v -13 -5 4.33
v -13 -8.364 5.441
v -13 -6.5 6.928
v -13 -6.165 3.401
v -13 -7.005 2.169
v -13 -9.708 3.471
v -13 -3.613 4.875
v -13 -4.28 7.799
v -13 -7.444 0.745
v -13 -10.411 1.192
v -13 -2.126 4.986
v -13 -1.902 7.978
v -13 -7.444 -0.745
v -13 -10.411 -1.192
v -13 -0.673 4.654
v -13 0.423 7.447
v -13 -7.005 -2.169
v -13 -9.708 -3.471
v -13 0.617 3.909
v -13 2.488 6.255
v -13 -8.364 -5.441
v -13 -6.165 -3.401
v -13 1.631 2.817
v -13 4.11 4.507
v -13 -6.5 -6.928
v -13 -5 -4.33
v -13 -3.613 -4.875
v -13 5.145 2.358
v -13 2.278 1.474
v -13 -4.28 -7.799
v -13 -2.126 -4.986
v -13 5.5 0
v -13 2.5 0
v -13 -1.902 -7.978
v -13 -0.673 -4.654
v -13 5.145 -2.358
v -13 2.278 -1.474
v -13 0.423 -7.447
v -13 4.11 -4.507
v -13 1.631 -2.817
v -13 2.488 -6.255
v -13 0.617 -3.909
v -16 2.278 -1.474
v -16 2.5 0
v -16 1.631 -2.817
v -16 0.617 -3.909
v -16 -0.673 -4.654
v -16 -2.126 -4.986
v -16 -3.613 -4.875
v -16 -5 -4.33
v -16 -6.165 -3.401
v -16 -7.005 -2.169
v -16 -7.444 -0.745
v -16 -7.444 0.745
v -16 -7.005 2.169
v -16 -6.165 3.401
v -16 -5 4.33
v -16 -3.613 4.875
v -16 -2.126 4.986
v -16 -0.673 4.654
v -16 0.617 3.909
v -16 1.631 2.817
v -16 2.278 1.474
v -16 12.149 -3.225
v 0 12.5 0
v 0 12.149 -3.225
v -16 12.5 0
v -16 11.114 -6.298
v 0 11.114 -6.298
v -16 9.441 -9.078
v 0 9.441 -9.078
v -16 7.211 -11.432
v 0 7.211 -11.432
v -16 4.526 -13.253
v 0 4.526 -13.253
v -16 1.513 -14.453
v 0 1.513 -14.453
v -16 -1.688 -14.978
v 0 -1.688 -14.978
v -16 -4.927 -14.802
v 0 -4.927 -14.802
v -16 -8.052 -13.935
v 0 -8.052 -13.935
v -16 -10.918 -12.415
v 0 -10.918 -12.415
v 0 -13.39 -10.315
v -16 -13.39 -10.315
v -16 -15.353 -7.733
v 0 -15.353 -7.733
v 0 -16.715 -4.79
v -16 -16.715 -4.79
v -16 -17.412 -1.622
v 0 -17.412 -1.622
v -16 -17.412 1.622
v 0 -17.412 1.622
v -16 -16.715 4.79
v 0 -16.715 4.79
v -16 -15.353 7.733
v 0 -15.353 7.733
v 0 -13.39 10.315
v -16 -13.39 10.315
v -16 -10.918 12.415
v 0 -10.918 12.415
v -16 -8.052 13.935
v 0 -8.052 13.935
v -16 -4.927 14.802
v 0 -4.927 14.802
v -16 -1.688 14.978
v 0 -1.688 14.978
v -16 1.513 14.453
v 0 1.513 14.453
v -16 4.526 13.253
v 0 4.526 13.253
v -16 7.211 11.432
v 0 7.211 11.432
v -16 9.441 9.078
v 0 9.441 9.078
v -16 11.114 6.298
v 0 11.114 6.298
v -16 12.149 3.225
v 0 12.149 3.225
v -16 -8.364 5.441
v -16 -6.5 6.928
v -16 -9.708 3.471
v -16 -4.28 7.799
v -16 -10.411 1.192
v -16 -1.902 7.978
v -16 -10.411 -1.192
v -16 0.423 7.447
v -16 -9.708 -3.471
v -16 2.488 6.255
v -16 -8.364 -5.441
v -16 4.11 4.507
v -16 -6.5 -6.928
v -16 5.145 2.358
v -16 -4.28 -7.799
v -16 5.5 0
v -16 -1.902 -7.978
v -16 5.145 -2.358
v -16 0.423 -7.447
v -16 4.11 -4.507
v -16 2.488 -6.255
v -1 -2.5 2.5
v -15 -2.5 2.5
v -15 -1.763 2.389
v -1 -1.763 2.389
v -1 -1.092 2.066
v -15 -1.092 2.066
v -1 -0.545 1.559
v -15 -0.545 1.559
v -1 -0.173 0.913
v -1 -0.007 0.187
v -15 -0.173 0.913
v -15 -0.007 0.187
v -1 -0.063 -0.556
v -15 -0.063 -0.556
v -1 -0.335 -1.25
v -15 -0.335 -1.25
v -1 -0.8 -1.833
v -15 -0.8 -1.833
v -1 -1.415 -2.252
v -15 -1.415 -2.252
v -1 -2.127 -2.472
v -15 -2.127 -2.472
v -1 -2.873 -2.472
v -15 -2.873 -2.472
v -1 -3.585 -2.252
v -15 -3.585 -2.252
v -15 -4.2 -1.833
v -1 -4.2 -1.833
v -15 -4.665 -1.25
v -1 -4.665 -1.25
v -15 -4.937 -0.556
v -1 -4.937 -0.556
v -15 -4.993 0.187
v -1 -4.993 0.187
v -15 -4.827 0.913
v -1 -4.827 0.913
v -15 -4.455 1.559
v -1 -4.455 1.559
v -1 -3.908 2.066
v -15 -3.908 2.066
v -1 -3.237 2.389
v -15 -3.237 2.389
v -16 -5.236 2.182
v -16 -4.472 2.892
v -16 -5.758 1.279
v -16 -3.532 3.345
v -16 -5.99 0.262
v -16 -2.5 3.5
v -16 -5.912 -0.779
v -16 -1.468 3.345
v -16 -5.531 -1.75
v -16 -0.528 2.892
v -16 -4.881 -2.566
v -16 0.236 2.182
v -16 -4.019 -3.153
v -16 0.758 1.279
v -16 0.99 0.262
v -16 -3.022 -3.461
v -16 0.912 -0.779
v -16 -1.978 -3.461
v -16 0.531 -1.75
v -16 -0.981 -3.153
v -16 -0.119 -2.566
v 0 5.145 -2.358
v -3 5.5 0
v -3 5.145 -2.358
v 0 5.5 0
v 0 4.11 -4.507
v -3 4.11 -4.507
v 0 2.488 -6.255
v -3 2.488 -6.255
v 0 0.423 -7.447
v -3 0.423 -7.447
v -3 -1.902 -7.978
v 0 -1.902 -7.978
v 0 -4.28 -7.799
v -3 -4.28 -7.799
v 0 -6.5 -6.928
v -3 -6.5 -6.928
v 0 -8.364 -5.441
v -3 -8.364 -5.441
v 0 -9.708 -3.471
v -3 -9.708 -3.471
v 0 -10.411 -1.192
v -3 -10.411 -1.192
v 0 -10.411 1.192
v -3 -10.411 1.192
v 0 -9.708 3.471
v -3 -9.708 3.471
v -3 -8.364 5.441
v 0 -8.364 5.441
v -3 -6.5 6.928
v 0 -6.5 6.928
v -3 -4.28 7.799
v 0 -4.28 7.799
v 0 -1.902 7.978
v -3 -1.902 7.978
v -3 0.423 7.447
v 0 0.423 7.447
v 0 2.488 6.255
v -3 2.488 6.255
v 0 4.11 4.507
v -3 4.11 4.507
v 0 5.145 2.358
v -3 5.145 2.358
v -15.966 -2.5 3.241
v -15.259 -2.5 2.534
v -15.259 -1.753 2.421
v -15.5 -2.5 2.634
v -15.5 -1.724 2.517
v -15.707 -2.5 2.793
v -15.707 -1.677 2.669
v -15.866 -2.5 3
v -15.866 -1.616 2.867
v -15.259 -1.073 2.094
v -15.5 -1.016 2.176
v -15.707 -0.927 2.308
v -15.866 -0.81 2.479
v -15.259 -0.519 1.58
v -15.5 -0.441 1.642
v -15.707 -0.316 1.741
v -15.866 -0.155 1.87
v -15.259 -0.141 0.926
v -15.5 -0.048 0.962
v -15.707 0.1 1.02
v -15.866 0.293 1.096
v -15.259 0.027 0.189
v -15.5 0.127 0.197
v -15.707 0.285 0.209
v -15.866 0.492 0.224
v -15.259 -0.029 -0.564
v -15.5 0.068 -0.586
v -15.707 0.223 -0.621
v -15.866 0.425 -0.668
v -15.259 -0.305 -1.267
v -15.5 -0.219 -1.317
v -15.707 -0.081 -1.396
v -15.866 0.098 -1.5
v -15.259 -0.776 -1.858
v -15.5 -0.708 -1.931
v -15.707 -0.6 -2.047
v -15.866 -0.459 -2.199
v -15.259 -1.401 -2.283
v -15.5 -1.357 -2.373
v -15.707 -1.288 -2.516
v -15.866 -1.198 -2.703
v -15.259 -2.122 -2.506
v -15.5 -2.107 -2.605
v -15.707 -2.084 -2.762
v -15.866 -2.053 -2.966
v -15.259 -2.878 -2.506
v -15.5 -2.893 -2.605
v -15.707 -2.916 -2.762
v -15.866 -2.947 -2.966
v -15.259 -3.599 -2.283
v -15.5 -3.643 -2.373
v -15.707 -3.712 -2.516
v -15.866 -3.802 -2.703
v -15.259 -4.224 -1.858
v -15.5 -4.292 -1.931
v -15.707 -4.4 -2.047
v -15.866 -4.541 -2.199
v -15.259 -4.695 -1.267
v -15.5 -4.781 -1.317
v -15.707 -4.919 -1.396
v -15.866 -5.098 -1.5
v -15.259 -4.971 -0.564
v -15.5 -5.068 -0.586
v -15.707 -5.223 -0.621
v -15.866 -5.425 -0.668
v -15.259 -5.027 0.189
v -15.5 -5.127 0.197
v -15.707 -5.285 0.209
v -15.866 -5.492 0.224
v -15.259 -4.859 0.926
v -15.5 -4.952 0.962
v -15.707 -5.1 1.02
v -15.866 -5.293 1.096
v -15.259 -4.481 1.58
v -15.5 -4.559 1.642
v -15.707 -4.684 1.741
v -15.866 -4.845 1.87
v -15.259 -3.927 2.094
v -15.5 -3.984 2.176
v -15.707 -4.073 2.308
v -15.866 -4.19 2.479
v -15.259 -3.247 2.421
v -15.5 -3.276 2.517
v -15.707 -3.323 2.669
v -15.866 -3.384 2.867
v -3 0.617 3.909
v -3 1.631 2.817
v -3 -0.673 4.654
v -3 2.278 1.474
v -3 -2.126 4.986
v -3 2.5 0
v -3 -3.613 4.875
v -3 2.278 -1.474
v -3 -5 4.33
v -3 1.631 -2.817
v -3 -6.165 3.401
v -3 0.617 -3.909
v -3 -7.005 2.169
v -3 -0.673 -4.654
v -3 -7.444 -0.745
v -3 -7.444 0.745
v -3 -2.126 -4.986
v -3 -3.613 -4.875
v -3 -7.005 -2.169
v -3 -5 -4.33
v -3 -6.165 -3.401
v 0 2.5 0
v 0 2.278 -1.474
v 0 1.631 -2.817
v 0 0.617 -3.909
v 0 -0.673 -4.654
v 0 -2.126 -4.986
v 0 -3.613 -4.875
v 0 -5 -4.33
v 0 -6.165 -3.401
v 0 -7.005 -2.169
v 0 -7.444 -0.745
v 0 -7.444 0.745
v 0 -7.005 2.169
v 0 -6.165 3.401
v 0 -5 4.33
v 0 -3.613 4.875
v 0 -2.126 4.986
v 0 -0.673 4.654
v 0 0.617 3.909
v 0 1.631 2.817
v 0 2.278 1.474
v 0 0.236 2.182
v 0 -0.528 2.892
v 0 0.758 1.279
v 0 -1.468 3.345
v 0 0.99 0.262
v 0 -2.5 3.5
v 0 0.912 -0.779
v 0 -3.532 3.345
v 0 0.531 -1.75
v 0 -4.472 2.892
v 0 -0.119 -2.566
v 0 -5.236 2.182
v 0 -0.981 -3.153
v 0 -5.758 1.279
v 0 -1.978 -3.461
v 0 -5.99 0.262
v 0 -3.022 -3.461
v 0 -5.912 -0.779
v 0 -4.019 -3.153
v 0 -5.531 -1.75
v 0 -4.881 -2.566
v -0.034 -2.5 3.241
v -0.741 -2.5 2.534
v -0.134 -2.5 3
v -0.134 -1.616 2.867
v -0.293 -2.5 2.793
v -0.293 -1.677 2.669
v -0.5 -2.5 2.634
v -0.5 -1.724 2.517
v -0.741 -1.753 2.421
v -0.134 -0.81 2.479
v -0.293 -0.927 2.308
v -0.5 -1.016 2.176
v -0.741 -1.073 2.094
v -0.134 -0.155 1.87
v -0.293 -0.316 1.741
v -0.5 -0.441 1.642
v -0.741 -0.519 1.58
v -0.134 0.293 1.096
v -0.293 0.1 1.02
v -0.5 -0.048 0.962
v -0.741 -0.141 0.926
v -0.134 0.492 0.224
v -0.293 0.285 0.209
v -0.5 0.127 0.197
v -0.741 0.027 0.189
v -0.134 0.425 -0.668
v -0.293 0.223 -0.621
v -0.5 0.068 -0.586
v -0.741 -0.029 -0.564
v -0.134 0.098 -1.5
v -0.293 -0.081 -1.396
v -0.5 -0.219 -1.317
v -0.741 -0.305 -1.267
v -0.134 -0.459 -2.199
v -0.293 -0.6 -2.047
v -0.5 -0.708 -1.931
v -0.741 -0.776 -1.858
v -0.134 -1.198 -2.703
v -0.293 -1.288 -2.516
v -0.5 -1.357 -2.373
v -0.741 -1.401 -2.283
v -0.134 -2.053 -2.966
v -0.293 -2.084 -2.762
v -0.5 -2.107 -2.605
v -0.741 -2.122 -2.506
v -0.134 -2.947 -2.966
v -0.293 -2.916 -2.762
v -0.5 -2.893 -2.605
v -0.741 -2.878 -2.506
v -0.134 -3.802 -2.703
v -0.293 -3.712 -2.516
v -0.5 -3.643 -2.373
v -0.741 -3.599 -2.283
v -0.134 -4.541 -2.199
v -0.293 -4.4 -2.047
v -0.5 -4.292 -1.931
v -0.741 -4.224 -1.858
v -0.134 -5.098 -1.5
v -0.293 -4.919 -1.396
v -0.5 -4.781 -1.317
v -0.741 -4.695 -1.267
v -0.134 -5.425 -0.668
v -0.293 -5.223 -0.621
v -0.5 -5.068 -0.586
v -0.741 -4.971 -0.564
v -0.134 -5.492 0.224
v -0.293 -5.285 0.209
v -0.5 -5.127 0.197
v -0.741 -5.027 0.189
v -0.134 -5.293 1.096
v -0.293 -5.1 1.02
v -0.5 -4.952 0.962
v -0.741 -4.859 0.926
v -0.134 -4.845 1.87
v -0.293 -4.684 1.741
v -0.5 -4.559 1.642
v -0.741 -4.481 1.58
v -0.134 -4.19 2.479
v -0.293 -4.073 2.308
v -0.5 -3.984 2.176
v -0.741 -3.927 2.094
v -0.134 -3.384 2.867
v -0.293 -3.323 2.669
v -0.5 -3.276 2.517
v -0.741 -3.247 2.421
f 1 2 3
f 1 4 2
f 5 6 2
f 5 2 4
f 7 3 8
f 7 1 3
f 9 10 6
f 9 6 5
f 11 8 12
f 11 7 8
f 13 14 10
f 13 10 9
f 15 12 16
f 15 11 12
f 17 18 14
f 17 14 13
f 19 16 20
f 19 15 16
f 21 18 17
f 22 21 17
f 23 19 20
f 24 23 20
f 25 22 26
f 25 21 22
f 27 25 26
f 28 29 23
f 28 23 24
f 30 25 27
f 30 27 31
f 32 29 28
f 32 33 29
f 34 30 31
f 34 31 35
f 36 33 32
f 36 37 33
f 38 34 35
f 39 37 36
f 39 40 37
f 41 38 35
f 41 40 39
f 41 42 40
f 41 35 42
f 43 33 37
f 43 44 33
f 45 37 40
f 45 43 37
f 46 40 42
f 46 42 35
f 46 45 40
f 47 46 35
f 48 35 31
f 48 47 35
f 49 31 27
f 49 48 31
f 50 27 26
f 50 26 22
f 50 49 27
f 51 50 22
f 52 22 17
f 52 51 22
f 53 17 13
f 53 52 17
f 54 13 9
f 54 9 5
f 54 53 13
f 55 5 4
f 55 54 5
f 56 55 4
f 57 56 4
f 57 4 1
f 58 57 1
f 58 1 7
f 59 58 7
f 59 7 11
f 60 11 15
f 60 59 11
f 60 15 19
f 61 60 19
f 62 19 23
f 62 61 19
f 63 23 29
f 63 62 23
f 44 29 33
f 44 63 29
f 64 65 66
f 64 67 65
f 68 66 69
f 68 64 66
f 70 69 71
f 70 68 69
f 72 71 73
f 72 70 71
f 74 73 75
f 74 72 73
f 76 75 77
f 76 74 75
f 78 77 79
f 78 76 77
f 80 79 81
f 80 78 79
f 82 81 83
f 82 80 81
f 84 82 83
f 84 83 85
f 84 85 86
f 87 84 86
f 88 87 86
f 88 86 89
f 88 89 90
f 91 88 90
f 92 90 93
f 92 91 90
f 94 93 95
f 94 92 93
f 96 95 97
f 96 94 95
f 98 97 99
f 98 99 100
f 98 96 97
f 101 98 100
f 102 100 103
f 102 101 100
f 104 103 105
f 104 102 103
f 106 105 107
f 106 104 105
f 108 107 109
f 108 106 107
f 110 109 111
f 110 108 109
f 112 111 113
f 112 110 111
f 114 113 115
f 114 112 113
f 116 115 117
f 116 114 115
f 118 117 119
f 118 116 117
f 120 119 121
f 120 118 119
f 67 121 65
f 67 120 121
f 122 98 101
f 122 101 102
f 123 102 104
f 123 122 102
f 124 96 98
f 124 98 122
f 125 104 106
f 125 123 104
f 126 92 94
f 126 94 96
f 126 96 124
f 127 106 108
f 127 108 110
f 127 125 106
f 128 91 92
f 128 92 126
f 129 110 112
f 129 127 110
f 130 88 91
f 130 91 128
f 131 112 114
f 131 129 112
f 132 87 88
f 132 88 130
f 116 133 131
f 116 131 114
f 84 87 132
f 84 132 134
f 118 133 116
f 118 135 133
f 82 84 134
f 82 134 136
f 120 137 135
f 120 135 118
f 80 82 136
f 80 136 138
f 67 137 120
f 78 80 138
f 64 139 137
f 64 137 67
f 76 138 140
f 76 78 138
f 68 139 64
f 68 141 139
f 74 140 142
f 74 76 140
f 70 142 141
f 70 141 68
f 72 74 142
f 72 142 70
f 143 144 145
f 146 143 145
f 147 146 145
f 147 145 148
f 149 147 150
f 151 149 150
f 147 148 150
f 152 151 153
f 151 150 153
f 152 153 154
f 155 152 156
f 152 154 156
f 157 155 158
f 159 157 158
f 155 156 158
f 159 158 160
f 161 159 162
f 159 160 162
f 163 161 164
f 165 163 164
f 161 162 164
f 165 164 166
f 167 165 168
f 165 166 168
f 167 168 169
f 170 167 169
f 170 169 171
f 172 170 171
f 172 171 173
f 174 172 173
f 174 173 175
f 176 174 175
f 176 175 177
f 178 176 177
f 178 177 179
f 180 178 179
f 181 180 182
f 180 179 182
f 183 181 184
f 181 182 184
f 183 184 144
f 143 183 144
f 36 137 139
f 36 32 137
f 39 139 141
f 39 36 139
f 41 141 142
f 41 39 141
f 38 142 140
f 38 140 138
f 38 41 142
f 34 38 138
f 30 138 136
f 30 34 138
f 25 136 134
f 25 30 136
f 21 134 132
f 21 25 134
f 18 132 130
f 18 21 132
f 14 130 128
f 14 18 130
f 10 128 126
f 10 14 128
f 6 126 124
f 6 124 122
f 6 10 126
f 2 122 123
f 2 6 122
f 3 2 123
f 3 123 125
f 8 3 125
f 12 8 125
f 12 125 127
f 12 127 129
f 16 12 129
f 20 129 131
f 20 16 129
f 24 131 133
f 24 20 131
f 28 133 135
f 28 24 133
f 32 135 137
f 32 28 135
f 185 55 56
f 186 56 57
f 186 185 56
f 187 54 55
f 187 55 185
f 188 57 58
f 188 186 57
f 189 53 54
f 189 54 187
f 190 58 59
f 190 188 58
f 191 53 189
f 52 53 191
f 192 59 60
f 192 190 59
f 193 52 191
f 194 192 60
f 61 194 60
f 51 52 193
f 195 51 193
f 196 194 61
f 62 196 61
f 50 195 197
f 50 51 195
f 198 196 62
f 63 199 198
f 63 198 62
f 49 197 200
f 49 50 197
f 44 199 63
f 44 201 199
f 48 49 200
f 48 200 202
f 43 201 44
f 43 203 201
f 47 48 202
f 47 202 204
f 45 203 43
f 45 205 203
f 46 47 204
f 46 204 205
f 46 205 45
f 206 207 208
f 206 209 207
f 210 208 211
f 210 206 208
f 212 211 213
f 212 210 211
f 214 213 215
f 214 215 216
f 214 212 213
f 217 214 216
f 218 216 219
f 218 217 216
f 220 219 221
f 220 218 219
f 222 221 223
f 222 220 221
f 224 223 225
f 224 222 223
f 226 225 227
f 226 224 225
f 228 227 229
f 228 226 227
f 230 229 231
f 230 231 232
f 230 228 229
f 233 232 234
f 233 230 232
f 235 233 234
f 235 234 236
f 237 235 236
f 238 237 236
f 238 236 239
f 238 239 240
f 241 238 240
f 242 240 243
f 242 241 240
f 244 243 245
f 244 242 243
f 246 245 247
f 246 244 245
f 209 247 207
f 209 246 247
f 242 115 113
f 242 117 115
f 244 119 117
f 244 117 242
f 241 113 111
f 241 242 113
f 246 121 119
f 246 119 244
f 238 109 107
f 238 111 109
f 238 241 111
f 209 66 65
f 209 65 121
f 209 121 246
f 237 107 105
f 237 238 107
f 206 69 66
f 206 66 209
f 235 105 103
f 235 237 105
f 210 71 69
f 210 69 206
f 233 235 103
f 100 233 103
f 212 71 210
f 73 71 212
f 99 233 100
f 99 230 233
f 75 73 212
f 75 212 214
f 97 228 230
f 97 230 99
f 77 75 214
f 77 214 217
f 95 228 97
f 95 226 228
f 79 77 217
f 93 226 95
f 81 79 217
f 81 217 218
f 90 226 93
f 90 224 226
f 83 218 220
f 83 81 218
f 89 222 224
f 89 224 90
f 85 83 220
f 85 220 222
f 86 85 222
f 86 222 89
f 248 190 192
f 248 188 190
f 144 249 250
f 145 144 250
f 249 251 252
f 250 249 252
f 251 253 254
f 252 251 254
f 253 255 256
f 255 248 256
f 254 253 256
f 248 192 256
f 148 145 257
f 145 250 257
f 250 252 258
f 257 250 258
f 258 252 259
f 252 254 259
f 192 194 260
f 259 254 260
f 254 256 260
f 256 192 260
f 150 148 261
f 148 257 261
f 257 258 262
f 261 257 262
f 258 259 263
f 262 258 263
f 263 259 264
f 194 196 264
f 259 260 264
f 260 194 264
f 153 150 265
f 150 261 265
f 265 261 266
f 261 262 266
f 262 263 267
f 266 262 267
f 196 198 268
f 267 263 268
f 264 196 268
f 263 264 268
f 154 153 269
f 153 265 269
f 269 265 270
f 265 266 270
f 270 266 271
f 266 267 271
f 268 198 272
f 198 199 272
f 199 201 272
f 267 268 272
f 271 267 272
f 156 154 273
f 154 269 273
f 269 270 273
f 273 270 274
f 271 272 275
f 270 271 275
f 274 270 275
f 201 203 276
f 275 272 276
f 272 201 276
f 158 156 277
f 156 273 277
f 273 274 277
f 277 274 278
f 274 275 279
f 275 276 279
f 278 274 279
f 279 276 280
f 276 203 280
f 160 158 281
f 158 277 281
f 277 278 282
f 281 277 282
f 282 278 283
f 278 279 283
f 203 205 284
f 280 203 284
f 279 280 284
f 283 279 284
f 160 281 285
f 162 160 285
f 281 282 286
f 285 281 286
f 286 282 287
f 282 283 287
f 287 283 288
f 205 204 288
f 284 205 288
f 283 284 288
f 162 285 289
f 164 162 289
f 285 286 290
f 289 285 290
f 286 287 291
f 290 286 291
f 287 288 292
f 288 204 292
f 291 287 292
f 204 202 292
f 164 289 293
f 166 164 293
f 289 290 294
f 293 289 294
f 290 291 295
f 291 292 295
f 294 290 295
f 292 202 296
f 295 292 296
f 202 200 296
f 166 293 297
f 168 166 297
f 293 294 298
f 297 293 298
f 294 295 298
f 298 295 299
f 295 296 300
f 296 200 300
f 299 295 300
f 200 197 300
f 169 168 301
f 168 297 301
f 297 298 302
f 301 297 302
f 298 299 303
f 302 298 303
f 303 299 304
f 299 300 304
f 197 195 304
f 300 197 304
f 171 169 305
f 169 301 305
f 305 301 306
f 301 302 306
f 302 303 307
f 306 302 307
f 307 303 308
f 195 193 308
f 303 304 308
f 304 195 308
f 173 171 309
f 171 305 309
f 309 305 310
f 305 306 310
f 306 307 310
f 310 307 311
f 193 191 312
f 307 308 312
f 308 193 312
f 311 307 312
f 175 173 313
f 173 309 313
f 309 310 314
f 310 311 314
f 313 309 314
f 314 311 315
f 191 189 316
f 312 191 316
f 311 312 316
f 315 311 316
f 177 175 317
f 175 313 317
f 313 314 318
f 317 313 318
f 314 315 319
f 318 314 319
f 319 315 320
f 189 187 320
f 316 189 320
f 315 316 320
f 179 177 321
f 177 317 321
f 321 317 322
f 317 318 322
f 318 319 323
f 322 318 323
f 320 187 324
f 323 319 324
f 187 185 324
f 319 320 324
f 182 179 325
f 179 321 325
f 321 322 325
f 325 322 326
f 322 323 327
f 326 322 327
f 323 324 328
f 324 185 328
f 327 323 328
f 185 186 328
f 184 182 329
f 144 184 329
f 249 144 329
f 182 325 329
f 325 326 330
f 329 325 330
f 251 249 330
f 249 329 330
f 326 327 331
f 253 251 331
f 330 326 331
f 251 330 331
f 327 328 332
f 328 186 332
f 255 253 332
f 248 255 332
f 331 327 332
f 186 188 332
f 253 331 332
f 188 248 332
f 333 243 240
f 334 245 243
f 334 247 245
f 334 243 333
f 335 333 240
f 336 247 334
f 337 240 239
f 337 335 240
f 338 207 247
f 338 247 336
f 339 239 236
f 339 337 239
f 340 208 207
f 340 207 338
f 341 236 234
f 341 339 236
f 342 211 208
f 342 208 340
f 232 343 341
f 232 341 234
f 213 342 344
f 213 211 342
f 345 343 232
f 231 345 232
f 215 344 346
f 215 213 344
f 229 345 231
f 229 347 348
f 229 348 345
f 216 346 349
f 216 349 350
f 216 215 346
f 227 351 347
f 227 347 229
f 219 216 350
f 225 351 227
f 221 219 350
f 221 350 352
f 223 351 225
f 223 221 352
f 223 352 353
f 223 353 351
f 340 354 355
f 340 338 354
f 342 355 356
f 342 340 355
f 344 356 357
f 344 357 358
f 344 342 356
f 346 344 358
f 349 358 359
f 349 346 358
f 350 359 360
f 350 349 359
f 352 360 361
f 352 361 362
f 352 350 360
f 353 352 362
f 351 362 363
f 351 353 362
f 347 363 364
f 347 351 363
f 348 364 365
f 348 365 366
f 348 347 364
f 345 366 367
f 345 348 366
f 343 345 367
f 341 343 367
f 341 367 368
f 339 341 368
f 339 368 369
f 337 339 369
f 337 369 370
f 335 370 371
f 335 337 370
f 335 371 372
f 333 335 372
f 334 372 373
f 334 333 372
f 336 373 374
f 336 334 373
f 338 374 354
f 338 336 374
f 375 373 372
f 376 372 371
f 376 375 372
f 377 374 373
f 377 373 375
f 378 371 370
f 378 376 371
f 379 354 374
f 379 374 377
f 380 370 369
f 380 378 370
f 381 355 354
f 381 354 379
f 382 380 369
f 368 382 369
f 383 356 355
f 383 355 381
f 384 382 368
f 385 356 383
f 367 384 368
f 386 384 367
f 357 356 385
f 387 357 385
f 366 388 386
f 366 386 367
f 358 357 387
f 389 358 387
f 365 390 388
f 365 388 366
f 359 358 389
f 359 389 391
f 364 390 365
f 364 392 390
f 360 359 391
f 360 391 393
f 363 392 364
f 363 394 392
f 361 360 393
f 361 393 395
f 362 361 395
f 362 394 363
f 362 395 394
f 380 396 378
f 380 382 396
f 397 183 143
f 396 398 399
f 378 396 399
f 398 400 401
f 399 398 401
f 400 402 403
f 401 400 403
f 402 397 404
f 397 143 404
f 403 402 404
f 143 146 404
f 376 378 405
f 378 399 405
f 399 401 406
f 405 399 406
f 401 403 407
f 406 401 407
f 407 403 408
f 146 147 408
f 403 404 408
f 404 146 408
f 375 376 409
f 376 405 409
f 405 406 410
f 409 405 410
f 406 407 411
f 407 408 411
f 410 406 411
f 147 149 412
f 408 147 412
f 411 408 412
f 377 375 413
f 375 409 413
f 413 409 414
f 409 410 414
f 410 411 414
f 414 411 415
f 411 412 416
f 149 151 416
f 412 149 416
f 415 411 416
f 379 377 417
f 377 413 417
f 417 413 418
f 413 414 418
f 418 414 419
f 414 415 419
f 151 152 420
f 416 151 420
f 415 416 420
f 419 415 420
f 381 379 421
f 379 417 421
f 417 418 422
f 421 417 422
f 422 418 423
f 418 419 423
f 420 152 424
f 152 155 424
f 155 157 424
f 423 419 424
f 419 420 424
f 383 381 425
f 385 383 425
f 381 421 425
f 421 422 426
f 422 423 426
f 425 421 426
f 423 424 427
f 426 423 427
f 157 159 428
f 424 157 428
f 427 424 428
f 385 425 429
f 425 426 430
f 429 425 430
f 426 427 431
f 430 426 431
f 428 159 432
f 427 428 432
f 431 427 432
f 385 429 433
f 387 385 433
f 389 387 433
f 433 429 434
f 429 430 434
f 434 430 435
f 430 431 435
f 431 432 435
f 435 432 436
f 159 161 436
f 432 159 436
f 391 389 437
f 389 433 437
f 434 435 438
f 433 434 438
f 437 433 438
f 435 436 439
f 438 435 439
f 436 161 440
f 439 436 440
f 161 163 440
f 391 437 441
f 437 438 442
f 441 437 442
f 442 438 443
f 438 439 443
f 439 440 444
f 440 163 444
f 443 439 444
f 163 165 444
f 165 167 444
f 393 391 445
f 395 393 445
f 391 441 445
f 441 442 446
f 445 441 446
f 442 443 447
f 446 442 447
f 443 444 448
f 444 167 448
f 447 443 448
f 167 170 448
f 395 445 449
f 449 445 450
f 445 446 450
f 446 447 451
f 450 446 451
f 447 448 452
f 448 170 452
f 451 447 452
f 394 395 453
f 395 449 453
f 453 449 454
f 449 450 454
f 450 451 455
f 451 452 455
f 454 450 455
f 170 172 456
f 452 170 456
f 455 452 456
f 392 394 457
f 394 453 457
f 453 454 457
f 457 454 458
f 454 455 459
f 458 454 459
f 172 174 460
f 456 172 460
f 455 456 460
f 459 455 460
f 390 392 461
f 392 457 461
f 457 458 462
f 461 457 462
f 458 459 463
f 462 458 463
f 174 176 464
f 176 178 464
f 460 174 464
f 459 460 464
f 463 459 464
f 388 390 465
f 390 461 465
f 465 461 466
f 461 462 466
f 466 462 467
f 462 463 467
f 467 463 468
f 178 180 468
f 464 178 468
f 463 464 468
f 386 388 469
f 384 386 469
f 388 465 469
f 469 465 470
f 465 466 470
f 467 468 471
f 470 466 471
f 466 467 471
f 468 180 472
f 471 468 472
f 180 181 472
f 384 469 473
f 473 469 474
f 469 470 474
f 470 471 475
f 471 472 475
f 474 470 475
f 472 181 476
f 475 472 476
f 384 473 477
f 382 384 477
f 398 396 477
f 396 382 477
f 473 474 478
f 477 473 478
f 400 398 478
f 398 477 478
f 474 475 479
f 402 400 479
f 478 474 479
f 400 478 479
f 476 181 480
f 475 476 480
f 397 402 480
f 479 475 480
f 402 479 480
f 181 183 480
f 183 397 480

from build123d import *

# Parameters (mm, degrees)
SKETCH2_R          = 2.5
CUT_EXTRUDE1_DEPTH = 16
FILLET1_R          = 1


with BuildPart() as part:
    # Sketch1 → Revolve2 (revolve)
    with BuildSketch(Plane.XY):
        Polygon((0, 2.5), (-3, 2.5), (-3, 5.5), (0, 5.5), (0, 12.5), (-16, 12.5), (-16, 5.5), (-13, 5.5), (-13, 2.5), (-16, 2.5), (-16, -2.5), (0, -2.5), align=None)
    revolve(axis=Axis((8.187259668, -2.5, 0), (-1, 0, 0)))

    # Sketch2 → Cut-Extrude1 (cut)
    with BuildSketch(Plane.ZY.offset(16)):
        with Locations((0, -2.5)):
            Circle(SKETCH2_R)
    extrude(amount=-CUT_EXTRUDE1_DEPTH, mode=Mode.SUBTRACT)

    # Fillet1
    fillet1_edges = [part.edges().sort_by_distance(p)[0] for p in [
        (-16, -2.5, -2.5),
        (0, -2.5, -2.5),
    ]]
    fillet(fillet1_edges, radius=FILLET1_R)


solid = part.part
